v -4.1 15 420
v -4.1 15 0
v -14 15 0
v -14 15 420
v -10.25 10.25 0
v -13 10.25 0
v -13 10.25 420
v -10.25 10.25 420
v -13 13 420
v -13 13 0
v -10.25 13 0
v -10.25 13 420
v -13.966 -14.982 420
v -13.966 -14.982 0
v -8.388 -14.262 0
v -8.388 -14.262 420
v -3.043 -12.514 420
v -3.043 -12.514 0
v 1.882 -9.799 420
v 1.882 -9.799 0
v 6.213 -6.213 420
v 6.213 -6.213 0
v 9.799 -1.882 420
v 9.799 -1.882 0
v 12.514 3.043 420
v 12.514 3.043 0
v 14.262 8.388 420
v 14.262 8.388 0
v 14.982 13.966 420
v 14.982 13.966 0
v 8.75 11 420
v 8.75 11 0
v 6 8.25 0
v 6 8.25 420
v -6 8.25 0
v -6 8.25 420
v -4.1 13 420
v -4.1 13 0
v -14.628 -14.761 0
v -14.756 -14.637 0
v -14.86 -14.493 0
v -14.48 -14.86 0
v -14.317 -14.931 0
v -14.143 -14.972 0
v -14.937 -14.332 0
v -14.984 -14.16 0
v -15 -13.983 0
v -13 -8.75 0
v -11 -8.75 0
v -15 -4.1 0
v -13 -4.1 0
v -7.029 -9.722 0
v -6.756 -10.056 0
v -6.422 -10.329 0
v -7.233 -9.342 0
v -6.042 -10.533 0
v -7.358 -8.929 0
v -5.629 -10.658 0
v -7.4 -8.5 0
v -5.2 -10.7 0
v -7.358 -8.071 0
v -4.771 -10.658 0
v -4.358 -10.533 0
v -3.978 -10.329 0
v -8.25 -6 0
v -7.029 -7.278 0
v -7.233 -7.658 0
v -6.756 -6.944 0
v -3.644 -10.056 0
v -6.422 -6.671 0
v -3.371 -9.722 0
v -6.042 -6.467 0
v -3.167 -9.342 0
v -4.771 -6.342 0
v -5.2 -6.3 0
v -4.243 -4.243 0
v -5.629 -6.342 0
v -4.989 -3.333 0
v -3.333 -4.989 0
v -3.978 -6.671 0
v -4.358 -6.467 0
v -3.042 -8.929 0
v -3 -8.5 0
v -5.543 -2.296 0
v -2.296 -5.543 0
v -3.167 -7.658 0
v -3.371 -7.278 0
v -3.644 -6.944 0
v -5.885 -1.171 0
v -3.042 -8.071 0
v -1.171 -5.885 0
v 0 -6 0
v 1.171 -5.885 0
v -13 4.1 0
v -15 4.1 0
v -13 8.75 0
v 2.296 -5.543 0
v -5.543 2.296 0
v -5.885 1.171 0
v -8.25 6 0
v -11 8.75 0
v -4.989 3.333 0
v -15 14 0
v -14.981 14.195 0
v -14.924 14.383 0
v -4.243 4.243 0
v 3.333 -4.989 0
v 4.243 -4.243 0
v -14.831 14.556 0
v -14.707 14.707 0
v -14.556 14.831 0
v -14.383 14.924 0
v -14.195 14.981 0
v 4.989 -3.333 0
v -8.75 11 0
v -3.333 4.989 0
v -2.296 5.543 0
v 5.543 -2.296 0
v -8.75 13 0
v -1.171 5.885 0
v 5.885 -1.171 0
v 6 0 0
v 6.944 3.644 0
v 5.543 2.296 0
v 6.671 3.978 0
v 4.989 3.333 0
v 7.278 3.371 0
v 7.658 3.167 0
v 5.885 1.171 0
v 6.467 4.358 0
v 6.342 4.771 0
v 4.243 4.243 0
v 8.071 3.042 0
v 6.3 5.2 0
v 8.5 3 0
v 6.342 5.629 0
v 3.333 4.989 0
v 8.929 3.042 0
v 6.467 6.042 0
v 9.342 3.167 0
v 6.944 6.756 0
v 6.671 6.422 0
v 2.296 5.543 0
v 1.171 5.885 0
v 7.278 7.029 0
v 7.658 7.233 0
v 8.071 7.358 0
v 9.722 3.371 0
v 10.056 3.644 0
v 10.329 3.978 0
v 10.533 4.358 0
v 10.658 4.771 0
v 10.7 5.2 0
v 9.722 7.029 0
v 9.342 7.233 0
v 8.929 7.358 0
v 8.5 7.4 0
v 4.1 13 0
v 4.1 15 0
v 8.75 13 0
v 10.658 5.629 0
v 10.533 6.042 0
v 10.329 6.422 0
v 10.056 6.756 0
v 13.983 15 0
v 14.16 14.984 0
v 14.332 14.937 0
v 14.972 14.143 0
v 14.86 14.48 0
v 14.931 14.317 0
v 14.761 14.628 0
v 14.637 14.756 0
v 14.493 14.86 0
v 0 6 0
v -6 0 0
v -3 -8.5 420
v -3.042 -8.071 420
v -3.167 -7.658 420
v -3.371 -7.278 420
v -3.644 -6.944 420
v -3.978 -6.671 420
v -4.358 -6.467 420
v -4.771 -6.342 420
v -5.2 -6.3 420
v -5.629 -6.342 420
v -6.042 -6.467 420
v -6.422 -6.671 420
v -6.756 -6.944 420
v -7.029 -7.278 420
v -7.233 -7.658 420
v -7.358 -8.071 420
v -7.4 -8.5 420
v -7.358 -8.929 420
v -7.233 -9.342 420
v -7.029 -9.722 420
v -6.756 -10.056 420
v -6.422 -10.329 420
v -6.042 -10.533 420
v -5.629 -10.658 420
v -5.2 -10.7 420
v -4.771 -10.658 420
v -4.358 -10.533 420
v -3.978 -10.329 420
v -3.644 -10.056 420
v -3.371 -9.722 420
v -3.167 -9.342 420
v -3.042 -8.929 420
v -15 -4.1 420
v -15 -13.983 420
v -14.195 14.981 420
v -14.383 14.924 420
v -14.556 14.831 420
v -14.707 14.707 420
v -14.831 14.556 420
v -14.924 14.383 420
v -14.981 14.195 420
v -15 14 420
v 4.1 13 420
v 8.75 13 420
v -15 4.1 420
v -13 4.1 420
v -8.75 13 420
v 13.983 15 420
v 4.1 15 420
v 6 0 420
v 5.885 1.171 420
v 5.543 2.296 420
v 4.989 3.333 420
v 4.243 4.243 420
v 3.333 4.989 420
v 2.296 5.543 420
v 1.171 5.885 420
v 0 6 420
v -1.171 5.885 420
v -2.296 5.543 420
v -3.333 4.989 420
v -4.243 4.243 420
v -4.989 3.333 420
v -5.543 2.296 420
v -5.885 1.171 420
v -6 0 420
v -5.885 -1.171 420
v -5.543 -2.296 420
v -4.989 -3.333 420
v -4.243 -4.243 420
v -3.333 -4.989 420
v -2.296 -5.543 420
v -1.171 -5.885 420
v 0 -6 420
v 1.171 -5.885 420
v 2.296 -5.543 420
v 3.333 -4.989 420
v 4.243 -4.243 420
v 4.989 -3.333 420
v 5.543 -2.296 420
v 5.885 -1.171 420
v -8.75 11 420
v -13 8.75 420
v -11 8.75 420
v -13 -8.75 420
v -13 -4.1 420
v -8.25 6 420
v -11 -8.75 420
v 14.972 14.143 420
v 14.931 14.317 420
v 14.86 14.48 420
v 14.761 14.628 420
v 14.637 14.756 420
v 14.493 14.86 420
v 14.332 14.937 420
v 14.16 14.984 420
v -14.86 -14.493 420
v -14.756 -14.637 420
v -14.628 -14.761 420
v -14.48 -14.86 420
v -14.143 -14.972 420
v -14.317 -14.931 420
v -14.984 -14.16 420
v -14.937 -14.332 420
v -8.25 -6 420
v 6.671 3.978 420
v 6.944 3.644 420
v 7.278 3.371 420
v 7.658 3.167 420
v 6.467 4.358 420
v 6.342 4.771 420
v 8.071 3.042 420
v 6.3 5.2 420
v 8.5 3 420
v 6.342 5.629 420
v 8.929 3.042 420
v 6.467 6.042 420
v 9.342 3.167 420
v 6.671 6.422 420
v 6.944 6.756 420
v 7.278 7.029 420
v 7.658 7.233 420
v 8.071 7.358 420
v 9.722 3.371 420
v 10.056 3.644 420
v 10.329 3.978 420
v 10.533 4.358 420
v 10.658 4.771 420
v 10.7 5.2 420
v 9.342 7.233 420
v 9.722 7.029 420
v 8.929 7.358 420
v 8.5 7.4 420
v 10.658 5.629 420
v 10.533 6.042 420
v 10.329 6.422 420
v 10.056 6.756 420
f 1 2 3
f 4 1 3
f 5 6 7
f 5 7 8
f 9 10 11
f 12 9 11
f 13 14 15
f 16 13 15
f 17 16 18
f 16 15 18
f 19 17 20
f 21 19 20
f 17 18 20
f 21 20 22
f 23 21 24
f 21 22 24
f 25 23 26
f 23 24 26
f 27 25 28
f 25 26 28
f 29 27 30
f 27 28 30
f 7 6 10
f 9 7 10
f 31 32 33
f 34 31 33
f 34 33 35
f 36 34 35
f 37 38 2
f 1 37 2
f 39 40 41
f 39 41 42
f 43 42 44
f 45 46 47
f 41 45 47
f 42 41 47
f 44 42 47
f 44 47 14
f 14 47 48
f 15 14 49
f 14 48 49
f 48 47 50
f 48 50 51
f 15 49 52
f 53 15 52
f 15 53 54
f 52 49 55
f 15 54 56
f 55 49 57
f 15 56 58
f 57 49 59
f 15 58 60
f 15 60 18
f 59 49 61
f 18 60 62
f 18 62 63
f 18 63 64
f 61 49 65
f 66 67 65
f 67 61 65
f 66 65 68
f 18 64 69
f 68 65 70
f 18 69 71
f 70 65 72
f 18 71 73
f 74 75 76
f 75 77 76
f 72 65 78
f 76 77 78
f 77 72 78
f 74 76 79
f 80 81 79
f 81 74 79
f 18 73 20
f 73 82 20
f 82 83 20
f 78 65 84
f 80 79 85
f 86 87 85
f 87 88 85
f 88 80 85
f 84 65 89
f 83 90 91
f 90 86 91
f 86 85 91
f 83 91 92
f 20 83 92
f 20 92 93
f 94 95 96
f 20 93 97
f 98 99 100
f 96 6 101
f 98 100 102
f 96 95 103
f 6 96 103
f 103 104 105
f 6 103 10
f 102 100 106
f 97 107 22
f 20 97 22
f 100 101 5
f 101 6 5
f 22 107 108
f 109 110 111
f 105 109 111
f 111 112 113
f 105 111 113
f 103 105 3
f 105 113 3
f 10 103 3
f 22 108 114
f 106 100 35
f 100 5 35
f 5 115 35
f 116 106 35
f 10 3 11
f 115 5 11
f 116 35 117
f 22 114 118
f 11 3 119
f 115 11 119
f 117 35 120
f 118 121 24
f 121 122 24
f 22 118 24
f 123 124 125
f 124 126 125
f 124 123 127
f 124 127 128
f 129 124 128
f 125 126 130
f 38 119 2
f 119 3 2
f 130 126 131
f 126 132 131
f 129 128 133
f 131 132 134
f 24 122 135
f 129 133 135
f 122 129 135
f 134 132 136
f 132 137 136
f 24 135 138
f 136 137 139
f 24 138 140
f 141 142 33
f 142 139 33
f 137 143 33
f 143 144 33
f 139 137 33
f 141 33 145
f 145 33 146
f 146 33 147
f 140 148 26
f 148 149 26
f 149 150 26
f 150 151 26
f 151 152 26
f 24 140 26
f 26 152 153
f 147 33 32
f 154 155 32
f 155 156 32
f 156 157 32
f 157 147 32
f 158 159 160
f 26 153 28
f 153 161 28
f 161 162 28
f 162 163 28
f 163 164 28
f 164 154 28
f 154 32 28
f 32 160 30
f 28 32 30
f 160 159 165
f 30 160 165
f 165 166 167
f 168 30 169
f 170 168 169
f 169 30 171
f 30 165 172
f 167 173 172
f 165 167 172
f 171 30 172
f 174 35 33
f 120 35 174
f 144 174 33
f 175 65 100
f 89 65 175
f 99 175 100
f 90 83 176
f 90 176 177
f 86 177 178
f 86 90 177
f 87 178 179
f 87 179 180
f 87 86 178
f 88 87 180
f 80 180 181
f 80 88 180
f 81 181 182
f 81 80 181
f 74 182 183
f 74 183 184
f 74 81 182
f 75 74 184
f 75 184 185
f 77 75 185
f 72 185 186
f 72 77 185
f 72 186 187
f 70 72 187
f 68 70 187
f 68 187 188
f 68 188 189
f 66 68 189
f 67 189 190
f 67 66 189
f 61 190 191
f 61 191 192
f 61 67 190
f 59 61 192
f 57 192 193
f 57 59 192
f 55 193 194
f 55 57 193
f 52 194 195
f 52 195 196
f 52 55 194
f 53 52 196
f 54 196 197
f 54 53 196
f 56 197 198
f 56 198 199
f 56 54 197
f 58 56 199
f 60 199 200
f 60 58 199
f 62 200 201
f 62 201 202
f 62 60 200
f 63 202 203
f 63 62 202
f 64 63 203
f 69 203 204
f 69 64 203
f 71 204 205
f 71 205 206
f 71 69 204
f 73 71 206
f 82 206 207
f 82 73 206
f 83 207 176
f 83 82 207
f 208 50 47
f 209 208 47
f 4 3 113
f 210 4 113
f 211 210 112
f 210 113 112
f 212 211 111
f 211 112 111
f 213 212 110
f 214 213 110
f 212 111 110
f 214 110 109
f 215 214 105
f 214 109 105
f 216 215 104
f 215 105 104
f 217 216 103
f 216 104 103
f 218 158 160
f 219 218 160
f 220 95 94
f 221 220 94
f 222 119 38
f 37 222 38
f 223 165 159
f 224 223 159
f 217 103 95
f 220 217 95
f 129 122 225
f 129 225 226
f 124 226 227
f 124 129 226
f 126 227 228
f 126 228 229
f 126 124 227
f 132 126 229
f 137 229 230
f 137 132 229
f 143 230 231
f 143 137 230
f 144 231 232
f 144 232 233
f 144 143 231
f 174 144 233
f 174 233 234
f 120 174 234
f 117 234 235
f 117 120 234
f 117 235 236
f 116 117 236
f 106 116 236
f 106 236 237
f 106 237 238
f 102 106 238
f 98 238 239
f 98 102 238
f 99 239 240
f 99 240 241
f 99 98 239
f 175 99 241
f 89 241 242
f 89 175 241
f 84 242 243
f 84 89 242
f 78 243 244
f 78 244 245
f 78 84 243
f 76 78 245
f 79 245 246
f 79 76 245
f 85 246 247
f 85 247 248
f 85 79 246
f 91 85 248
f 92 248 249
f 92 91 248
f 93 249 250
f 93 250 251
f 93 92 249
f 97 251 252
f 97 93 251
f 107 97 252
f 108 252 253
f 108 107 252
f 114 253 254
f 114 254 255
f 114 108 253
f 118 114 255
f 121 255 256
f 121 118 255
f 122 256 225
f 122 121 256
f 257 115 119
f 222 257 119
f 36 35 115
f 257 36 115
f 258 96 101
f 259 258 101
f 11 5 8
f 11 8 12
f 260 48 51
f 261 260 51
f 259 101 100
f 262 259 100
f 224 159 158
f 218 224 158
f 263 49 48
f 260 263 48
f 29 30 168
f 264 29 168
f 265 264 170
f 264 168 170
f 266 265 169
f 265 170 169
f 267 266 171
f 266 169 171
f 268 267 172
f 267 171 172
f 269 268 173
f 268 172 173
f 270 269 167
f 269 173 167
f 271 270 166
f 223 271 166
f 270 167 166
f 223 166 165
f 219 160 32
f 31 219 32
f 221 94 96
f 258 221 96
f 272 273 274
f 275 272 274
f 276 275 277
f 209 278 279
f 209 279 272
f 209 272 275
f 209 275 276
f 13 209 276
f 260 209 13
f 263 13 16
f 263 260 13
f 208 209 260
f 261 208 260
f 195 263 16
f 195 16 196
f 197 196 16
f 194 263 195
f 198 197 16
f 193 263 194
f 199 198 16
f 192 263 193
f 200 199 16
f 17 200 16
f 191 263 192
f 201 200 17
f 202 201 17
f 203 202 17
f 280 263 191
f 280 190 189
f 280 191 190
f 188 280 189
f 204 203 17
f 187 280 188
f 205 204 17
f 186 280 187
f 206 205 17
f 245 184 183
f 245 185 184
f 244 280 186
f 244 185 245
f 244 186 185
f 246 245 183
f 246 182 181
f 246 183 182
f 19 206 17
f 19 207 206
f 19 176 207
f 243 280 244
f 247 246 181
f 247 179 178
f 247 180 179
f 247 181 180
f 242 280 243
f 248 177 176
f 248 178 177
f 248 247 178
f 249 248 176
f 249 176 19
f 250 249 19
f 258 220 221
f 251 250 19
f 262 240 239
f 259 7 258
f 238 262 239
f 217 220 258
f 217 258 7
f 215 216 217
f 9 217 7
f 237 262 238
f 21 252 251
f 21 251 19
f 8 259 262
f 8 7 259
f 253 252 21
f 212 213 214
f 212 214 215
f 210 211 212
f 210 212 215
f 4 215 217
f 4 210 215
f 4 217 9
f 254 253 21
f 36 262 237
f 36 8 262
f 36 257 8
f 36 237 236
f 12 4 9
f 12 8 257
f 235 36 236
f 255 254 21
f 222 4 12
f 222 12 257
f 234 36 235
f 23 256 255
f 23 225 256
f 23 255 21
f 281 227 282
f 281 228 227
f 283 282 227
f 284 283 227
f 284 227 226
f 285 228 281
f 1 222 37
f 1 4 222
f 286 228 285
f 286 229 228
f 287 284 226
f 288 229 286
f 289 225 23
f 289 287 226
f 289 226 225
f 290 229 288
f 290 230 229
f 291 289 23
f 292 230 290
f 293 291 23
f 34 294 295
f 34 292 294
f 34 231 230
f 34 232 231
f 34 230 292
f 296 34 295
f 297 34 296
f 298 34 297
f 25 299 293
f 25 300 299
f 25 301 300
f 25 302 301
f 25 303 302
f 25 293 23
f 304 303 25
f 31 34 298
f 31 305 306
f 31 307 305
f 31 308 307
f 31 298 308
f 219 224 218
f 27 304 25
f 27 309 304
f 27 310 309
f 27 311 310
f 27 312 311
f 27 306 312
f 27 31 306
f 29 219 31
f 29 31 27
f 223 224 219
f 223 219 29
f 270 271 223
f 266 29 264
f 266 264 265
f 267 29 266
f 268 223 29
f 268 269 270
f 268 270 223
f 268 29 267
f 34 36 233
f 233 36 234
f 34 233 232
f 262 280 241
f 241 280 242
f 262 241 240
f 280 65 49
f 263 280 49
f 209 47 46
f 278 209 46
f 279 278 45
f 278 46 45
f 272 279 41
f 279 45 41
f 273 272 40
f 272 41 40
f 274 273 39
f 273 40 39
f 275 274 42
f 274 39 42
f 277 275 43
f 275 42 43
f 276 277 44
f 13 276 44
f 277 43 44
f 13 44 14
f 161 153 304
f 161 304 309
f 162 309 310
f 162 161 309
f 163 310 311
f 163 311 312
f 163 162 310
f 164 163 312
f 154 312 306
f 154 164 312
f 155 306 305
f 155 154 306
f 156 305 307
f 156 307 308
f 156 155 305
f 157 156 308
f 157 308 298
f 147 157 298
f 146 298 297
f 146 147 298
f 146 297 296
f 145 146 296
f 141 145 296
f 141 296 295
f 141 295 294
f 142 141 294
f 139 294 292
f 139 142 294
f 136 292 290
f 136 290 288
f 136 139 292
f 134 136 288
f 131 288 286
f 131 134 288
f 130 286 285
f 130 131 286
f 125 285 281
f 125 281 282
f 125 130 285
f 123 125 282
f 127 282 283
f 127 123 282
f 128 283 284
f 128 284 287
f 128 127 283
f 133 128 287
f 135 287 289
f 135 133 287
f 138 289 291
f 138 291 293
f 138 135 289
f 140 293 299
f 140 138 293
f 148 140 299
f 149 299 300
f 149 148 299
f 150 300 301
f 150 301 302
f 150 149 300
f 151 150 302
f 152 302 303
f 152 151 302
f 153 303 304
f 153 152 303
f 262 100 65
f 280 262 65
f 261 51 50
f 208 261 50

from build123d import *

# Parameters (mm, degrees)
SKETCH006_R   = 6
SKETCH006_R_2 = 2.2
SKETCH006_W   = 2.75
SKETCH006_H   = 2.75
PAD_DEPTH     = 420


with BuildPart() as part:
    # Sketch006 → Pad (new body)
    with BuildSketch(Plane.XY):
        with BuildLine():
            Line((13.982753, 15), (4.1, 15))
            Line((4.1, 15), (4.1, 13))
            Line((4.1, 13), (8.75, 13))
            Line((8.75, 13), (8.75, 11))
            Line((8.75, 11), (6, 8.25))
            Line((6, 8.25), (-6, 8.25))
            Line((-6, 8.25), (-8.75, 11))
            Line((-8.75, 11), (-8.75, 13))
            Line((-8.75, 13), (-4.1, 13))
            Line((-4.1, 13), (-4.1, 15))
            Line((-4.1, 15), (-14, 15))
            ThreePointArc((-14, 15), (-14.707107, 14.707107), (-15, 14))
            Line((-15, 14), (-15, 4.1))
            Line((-15, 4.1), (-13, 4.1))
            Line((-13, 4.1), (-13, 8.75))
            Line((-13, 8.75), (-11, 8.75))
            Line((-11, 8.75), (-8.25, 6))
            Line((-8.25, 6), (-8.25, -6))
            Line((-8.25, -6), (-11, -8.75))
            Line((-11, -8.75), (-13, -8.75))
            Line((-13, -8.75), (-13, -4.1))
            Line((-13, -4.1), (-15, -4.1))
            Line((-15, -4.1), (-15, -13.982753))
            ThreePointArc((-15, -13.982753), (-14.694808, -14.701948), (-13.965517, -14.982159))
            ThreePointArc((-13.965517, -14.982159), (6.213203, -6.213203), (14.982159, 13.965517))
            ThreePointArc((14.982159, 13.965517), (14.701948, 14.694808), (13.982753, 15))
        make_face()
        Circle(SKETCH006_R, mode=Mode.SUBTRACT)
        with Locations((-5.2, -8.5)):
            Circle(SKETCH006_R_2, mode=Mode.SUBTRACT)
        with Locations((8.5, 5.2)):
            Circle(SKETCH006_R_2, mode=Mode.SUBTRACT)
        with Locations((-11.625, 11.625)):
            Rectangle(SKETCH006_W, SKETCH006_H, mode=Mode.SUBTRACT)
    extrude(amount=PAD_DEPTH)


solid = part.part
